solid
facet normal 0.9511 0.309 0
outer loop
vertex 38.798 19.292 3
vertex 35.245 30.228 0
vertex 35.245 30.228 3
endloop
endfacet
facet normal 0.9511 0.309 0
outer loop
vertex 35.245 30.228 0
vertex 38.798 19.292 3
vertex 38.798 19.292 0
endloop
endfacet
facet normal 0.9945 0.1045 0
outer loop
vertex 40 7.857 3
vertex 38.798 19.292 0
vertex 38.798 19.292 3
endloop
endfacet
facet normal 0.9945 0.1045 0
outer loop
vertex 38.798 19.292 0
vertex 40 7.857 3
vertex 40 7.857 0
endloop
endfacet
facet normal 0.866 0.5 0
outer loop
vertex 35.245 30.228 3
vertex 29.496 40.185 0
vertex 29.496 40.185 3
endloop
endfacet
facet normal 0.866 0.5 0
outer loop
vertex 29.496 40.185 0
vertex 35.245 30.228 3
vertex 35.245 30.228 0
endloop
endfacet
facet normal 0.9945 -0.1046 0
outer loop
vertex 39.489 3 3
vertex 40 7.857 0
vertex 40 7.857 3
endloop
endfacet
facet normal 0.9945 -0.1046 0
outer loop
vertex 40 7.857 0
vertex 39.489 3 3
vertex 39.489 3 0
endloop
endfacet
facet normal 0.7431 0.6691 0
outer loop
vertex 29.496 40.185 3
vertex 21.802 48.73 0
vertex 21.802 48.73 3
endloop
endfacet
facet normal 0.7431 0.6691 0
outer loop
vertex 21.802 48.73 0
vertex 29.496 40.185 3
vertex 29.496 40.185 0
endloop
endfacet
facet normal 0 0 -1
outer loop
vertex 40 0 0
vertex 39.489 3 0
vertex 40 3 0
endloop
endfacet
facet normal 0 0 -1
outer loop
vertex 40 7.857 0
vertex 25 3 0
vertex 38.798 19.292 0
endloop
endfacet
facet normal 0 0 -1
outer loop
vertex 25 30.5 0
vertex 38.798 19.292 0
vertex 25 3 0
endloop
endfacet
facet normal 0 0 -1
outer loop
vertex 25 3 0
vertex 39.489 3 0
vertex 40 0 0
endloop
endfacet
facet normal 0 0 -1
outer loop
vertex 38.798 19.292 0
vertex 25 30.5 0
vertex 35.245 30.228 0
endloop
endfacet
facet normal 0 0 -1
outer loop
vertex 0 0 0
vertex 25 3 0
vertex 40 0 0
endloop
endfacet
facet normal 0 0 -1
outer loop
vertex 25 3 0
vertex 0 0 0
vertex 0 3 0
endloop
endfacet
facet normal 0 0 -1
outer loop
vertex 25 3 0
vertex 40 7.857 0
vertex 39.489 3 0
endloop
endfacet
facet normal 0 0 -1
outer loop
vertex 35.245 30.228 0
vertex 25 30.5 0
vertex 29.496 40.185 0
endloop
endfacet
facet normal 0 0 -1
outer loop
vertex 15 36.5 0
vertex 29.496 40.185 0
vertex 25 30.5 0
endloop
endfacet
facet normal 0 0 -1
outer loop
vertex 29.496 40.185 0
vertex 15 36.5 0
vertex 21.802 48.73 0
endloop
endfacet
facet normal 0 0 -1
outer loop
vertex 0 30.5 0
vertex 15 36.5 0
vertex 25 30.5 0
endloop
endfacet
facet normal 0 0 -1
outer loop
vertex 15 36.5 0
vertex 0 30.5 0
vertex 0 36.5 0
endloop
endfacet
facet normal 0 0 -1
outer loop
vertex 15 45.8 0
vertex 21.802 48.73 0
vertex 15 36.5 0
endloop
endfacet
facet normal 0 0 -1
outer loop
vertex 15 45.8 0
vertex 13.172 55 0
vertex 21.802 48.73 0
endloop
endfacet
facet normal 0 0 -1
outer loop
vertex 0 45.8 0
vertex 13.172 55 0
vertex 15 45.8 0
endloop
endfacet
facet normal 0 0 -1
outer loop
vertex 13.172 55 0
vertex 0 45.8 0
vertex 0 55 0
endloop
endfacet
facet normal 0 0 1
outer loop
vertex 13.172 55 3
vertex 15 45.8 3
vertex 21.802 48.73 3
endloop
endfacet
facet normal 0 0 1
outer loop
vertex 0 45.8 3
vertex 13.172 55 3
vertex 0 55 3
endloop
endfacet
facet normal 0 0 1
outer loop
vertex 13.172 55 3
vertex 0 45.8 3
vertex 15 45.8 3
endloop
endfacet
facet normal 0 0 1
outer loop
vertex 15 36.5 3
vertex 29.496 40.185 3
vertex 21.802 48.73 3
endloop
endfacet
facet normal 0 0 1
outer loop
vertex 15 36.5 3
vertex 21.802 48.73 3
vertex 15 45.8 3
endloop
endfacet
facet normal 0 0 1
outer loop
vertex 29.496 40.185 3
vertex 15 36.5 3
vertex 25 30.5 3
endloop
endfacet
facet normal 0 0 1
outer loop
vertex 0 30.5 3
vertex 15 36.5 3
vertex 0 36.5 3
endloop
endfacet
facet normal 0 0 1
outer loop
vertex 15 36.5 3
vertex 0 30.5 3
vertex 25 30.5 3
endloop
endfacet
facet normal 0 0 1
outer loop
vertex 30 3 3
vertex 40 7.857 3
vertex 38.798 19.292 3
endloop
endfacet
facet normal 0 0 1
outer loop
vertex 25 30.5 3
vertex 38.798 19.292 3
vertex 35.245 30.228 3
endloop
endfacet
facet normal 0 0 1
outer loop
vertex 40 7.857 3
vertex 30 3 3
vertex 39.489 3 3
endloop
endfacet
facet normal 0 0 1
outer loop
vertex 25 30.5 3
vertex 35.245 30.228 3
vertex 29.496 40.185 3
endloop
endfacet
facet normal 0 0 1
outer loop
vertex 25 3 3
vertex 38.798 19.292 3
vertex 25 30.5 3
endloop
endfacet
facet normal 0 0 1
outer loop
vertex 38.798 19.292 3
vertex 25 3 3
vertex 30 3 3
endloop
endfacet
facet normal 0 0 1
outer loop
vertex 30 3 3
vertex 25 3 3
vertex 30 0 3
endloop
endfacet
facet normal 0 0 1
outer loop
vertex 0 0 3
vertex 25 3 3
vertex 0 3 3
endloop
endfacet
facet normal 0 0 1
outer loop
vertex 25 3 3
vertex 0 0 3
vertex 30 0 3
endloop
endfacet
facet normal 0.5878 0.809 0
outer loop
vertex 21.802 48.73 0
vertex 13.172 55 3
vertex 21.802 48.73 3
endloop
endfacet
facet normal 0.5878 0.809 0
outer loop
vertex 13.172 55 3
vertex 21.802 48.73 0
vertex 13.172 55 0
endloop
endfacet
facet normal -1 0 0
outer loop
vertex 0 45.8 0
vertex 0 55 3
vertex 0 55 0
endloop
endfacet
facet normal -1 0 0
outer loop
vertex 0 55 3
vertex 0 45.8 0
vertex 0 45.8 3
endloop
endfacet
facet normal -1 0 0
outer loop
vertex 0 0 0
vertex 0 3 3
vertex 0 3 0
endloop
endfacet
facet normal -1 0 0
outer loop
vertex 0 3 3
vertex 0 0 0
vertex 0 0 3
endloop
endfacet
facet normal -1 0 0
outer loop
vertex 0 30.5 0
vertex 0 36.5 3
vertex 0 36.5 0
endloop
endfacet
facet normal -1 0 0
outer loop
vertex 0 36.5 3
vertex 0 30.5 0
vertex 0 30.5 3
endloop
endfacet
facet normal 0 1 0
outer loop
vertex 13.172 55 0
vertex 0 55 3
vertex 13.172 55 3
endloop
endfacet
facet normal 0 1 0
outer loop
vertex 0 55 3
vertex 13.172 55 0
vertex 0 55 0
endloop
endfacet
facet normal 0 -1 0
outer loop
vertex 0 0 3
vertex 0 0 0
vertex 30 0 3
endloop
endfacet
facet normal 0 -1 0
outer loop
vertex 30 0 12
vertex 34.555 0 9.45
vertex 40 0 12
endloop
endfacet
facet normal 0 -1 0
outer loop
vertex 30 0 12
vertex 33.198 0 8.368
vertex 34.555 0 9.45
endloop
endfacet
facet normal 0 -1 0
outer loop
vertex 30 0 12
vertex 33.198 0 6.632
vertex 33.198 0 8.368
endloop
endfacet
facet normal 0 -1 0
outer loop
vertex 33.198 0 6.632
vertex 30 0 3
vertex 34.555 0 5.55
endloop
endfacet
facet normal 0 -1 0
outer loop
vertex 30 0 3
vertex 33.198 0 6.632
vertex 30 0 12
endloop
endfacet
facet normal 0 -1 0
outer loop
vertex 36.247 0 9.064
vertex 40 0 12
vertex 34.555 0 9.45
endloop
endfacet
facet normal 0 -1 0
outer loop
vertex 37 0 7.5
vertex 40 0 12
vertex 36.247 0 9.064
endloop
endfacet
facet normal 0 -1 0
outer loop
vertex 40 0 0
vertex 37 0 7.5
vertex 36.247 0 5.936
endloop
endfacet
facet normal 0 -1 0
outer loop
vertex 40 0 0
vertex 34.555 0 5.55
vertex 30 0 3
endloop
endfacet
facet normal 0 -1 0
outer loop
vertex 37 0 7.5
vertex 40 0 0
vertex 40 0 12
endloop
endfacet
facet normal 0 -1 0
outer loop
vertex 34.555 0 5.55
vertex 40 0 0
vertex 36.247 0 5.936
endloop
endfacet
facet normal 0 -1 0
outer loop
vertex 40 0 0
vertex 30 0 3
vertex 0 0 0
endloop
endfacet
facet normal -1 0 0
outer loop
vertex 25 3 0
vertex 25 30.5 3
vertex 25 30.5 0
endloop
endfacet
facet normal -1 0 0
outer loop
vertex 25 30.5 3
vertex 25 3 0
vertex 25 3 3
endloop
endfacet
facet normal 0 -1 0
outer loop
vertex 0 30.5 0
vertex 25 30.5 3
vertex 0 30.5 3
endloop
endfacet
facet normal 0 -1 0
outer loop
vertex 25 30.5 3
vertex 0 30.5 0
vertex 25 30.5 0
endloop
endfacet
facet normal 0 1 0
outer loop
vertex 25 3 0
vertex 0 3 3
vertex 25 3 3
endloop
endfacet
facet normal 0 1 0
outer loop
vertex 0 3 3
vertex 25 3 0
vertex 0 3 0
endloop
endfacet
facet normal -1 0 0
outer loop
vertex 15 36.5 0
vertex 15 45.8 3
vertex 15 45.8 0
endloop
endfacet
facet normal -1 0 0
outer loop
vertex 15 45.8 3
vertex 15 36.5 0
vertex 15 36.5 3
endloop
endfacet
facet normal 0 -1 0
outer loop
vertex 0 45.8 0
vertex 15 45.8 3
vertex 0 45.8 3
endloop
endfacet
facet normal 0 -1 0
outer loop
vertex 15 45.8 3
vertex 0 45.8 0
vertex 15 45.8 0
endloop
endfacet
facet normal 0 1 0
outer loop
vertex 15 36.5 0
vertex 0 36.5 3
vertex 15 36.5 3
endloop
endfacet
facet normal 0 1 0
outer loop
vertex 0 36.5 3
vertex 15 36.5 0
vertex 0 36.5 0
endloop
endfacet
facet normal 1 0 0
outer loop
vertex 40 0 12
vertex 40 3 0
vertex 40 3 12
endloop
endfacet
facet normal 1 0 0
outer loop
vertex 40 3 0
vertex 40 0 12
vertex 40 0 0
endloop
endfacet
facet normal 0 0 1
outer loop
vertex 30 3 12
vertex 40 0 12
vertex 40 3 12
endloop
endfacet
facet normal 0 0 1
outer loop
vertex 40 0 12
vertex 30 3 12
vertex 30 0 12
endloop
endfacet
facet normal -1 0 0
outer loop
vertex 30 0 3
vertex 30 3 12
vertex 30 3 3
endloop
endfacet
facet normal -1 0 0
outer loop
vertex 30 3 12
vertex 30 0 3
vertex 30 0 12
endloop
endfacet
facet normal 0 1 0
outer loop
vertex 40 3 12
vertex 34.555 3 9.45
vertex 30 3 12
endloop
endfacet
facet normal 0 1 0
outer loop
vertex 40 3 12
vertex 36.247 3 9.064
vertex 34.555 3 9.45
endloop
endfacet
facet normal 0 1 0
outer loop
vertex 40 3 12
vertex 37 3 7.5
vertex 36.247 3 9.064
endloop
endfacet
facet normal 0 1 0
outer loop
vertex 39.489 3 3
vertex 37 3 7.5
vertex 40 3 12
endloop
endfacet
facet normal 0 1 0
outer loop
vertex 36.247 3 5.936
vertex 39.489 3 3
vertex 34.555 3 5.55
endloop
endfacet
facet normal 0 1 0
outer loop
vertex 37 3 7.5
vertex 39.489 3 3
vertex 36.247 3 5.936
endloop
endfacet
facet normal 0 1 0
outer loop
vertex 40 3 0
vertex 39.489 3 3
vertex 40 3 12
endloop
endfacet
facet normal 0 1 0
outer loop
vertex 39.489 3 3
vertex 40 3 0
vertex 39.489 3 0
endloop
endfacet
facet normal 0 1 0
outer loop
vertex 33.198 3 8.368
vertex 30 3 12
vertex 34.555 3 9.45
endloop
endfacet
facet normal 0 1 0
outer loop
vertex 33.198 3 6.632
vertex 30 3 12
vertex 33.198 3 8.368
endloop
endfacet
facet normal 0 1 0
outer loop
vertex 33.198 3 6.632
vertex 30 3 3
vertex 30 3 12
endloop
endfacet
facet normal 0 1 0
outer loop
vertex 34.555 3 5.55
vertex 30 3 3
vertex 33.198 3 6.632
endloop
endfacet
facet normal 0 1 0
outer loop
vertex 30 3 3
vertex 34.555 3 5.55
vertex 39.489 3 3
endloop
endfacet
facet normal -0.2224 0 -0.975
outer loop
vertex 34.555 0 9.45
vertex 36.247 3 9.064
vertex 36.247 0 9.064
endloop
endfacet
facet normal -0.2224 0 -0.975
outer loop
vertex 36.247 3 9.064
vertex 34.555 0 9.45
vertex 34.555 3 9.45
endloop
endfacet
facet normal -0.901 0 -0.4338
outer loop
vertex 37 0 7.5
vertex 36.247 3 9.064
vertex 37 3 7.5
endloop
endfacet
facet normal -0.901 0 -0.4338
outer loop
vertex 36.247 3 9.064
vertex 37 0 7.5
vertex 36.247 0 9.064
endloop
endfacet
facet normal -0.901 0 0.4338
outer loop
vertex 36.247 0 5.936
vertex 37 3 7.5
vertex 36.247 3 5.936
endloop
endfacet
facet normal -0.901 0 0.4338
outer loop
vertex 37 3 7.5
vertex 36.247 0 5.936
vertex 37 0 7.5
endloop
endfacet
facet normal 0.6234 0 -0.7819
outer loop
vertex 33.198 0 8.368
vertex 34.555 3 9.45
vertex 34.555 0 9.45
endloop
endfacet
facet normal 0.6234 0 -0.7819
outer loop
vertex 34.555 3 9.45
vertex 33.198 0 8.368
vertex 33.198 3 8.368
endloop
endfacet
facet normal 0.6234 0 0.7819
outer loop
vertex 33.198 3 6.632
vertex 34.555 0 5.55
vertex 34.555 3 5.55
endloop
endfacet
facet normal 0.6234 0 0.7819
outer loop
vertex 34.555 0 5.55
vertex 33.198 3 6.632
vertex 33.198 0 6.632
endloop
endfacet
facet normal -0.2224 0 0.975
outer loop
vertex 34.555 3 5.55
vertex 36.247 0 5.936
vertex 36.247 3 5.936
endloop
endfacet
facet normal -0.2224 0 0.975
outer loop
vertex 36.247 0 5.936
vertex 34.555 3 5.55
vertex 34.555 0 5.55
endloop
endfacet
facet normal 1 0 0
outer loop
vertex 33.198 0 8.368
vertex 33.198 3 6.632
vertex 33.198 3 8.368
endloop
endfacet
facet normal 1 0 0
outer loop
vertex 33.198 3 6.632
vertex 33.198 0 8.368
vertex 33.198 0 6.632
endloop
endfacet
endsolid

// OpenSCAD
// file: fin.scad
module fin (batteryBoxThickness, breadBoardThickness, flip) {
	thickness = 3;
	finheight = 55;
	finDepth = 40;

	componentSpacing = 6;

	holeDiameter = 4;
	clipWidth = 10;
	clipHeight = 12;


    echo (flip);
	if (flip > 0) {
		drawFin(180, (clipHeight - thickness) * -1, thickness);
    } else {
		drawFin(0, 0, 0);
	}

	module drawFin(flipValue, clipOffset, holeOffset) {
	rotate([0,flipValue,0])
	union() {
		difference() {
			intersection() { 
				translate([finDepth - finheight, finheight/7, thickness/2])
					cylinder(h=thickness, r=finheight, center=true);
				#cube([finDepth, finheight, thickness]);
			}

			translate([-15, thickness, thickness/-2])
			#cube([finDepth, batteryBoxThickness, thickness*2]);

			translate([-25, thickness + batteryBoxThickness + componentSpacing, thickness/-2])
				#cube([finDepth, breadBoardThickness, thickness*2]);
		}


		translate([finDepth - clipWidth,0, clipOffset])
		difference() {
			cube([clipWidth, thickness, clipHeight]);
			rotate([90,0,0])
				translate([clipWidth/2, clipHeight/2 + thickness/2 - holeOffset, thickness*-.5])
					#cylinder(h=thickness*2, r = holeDiameter/2, center=true);

		}	
	}
}

}
// main file
include <fin.scad>

fin(batteryBoxThickness=27.5, breadBoardThickness=9.3, flip=0);
